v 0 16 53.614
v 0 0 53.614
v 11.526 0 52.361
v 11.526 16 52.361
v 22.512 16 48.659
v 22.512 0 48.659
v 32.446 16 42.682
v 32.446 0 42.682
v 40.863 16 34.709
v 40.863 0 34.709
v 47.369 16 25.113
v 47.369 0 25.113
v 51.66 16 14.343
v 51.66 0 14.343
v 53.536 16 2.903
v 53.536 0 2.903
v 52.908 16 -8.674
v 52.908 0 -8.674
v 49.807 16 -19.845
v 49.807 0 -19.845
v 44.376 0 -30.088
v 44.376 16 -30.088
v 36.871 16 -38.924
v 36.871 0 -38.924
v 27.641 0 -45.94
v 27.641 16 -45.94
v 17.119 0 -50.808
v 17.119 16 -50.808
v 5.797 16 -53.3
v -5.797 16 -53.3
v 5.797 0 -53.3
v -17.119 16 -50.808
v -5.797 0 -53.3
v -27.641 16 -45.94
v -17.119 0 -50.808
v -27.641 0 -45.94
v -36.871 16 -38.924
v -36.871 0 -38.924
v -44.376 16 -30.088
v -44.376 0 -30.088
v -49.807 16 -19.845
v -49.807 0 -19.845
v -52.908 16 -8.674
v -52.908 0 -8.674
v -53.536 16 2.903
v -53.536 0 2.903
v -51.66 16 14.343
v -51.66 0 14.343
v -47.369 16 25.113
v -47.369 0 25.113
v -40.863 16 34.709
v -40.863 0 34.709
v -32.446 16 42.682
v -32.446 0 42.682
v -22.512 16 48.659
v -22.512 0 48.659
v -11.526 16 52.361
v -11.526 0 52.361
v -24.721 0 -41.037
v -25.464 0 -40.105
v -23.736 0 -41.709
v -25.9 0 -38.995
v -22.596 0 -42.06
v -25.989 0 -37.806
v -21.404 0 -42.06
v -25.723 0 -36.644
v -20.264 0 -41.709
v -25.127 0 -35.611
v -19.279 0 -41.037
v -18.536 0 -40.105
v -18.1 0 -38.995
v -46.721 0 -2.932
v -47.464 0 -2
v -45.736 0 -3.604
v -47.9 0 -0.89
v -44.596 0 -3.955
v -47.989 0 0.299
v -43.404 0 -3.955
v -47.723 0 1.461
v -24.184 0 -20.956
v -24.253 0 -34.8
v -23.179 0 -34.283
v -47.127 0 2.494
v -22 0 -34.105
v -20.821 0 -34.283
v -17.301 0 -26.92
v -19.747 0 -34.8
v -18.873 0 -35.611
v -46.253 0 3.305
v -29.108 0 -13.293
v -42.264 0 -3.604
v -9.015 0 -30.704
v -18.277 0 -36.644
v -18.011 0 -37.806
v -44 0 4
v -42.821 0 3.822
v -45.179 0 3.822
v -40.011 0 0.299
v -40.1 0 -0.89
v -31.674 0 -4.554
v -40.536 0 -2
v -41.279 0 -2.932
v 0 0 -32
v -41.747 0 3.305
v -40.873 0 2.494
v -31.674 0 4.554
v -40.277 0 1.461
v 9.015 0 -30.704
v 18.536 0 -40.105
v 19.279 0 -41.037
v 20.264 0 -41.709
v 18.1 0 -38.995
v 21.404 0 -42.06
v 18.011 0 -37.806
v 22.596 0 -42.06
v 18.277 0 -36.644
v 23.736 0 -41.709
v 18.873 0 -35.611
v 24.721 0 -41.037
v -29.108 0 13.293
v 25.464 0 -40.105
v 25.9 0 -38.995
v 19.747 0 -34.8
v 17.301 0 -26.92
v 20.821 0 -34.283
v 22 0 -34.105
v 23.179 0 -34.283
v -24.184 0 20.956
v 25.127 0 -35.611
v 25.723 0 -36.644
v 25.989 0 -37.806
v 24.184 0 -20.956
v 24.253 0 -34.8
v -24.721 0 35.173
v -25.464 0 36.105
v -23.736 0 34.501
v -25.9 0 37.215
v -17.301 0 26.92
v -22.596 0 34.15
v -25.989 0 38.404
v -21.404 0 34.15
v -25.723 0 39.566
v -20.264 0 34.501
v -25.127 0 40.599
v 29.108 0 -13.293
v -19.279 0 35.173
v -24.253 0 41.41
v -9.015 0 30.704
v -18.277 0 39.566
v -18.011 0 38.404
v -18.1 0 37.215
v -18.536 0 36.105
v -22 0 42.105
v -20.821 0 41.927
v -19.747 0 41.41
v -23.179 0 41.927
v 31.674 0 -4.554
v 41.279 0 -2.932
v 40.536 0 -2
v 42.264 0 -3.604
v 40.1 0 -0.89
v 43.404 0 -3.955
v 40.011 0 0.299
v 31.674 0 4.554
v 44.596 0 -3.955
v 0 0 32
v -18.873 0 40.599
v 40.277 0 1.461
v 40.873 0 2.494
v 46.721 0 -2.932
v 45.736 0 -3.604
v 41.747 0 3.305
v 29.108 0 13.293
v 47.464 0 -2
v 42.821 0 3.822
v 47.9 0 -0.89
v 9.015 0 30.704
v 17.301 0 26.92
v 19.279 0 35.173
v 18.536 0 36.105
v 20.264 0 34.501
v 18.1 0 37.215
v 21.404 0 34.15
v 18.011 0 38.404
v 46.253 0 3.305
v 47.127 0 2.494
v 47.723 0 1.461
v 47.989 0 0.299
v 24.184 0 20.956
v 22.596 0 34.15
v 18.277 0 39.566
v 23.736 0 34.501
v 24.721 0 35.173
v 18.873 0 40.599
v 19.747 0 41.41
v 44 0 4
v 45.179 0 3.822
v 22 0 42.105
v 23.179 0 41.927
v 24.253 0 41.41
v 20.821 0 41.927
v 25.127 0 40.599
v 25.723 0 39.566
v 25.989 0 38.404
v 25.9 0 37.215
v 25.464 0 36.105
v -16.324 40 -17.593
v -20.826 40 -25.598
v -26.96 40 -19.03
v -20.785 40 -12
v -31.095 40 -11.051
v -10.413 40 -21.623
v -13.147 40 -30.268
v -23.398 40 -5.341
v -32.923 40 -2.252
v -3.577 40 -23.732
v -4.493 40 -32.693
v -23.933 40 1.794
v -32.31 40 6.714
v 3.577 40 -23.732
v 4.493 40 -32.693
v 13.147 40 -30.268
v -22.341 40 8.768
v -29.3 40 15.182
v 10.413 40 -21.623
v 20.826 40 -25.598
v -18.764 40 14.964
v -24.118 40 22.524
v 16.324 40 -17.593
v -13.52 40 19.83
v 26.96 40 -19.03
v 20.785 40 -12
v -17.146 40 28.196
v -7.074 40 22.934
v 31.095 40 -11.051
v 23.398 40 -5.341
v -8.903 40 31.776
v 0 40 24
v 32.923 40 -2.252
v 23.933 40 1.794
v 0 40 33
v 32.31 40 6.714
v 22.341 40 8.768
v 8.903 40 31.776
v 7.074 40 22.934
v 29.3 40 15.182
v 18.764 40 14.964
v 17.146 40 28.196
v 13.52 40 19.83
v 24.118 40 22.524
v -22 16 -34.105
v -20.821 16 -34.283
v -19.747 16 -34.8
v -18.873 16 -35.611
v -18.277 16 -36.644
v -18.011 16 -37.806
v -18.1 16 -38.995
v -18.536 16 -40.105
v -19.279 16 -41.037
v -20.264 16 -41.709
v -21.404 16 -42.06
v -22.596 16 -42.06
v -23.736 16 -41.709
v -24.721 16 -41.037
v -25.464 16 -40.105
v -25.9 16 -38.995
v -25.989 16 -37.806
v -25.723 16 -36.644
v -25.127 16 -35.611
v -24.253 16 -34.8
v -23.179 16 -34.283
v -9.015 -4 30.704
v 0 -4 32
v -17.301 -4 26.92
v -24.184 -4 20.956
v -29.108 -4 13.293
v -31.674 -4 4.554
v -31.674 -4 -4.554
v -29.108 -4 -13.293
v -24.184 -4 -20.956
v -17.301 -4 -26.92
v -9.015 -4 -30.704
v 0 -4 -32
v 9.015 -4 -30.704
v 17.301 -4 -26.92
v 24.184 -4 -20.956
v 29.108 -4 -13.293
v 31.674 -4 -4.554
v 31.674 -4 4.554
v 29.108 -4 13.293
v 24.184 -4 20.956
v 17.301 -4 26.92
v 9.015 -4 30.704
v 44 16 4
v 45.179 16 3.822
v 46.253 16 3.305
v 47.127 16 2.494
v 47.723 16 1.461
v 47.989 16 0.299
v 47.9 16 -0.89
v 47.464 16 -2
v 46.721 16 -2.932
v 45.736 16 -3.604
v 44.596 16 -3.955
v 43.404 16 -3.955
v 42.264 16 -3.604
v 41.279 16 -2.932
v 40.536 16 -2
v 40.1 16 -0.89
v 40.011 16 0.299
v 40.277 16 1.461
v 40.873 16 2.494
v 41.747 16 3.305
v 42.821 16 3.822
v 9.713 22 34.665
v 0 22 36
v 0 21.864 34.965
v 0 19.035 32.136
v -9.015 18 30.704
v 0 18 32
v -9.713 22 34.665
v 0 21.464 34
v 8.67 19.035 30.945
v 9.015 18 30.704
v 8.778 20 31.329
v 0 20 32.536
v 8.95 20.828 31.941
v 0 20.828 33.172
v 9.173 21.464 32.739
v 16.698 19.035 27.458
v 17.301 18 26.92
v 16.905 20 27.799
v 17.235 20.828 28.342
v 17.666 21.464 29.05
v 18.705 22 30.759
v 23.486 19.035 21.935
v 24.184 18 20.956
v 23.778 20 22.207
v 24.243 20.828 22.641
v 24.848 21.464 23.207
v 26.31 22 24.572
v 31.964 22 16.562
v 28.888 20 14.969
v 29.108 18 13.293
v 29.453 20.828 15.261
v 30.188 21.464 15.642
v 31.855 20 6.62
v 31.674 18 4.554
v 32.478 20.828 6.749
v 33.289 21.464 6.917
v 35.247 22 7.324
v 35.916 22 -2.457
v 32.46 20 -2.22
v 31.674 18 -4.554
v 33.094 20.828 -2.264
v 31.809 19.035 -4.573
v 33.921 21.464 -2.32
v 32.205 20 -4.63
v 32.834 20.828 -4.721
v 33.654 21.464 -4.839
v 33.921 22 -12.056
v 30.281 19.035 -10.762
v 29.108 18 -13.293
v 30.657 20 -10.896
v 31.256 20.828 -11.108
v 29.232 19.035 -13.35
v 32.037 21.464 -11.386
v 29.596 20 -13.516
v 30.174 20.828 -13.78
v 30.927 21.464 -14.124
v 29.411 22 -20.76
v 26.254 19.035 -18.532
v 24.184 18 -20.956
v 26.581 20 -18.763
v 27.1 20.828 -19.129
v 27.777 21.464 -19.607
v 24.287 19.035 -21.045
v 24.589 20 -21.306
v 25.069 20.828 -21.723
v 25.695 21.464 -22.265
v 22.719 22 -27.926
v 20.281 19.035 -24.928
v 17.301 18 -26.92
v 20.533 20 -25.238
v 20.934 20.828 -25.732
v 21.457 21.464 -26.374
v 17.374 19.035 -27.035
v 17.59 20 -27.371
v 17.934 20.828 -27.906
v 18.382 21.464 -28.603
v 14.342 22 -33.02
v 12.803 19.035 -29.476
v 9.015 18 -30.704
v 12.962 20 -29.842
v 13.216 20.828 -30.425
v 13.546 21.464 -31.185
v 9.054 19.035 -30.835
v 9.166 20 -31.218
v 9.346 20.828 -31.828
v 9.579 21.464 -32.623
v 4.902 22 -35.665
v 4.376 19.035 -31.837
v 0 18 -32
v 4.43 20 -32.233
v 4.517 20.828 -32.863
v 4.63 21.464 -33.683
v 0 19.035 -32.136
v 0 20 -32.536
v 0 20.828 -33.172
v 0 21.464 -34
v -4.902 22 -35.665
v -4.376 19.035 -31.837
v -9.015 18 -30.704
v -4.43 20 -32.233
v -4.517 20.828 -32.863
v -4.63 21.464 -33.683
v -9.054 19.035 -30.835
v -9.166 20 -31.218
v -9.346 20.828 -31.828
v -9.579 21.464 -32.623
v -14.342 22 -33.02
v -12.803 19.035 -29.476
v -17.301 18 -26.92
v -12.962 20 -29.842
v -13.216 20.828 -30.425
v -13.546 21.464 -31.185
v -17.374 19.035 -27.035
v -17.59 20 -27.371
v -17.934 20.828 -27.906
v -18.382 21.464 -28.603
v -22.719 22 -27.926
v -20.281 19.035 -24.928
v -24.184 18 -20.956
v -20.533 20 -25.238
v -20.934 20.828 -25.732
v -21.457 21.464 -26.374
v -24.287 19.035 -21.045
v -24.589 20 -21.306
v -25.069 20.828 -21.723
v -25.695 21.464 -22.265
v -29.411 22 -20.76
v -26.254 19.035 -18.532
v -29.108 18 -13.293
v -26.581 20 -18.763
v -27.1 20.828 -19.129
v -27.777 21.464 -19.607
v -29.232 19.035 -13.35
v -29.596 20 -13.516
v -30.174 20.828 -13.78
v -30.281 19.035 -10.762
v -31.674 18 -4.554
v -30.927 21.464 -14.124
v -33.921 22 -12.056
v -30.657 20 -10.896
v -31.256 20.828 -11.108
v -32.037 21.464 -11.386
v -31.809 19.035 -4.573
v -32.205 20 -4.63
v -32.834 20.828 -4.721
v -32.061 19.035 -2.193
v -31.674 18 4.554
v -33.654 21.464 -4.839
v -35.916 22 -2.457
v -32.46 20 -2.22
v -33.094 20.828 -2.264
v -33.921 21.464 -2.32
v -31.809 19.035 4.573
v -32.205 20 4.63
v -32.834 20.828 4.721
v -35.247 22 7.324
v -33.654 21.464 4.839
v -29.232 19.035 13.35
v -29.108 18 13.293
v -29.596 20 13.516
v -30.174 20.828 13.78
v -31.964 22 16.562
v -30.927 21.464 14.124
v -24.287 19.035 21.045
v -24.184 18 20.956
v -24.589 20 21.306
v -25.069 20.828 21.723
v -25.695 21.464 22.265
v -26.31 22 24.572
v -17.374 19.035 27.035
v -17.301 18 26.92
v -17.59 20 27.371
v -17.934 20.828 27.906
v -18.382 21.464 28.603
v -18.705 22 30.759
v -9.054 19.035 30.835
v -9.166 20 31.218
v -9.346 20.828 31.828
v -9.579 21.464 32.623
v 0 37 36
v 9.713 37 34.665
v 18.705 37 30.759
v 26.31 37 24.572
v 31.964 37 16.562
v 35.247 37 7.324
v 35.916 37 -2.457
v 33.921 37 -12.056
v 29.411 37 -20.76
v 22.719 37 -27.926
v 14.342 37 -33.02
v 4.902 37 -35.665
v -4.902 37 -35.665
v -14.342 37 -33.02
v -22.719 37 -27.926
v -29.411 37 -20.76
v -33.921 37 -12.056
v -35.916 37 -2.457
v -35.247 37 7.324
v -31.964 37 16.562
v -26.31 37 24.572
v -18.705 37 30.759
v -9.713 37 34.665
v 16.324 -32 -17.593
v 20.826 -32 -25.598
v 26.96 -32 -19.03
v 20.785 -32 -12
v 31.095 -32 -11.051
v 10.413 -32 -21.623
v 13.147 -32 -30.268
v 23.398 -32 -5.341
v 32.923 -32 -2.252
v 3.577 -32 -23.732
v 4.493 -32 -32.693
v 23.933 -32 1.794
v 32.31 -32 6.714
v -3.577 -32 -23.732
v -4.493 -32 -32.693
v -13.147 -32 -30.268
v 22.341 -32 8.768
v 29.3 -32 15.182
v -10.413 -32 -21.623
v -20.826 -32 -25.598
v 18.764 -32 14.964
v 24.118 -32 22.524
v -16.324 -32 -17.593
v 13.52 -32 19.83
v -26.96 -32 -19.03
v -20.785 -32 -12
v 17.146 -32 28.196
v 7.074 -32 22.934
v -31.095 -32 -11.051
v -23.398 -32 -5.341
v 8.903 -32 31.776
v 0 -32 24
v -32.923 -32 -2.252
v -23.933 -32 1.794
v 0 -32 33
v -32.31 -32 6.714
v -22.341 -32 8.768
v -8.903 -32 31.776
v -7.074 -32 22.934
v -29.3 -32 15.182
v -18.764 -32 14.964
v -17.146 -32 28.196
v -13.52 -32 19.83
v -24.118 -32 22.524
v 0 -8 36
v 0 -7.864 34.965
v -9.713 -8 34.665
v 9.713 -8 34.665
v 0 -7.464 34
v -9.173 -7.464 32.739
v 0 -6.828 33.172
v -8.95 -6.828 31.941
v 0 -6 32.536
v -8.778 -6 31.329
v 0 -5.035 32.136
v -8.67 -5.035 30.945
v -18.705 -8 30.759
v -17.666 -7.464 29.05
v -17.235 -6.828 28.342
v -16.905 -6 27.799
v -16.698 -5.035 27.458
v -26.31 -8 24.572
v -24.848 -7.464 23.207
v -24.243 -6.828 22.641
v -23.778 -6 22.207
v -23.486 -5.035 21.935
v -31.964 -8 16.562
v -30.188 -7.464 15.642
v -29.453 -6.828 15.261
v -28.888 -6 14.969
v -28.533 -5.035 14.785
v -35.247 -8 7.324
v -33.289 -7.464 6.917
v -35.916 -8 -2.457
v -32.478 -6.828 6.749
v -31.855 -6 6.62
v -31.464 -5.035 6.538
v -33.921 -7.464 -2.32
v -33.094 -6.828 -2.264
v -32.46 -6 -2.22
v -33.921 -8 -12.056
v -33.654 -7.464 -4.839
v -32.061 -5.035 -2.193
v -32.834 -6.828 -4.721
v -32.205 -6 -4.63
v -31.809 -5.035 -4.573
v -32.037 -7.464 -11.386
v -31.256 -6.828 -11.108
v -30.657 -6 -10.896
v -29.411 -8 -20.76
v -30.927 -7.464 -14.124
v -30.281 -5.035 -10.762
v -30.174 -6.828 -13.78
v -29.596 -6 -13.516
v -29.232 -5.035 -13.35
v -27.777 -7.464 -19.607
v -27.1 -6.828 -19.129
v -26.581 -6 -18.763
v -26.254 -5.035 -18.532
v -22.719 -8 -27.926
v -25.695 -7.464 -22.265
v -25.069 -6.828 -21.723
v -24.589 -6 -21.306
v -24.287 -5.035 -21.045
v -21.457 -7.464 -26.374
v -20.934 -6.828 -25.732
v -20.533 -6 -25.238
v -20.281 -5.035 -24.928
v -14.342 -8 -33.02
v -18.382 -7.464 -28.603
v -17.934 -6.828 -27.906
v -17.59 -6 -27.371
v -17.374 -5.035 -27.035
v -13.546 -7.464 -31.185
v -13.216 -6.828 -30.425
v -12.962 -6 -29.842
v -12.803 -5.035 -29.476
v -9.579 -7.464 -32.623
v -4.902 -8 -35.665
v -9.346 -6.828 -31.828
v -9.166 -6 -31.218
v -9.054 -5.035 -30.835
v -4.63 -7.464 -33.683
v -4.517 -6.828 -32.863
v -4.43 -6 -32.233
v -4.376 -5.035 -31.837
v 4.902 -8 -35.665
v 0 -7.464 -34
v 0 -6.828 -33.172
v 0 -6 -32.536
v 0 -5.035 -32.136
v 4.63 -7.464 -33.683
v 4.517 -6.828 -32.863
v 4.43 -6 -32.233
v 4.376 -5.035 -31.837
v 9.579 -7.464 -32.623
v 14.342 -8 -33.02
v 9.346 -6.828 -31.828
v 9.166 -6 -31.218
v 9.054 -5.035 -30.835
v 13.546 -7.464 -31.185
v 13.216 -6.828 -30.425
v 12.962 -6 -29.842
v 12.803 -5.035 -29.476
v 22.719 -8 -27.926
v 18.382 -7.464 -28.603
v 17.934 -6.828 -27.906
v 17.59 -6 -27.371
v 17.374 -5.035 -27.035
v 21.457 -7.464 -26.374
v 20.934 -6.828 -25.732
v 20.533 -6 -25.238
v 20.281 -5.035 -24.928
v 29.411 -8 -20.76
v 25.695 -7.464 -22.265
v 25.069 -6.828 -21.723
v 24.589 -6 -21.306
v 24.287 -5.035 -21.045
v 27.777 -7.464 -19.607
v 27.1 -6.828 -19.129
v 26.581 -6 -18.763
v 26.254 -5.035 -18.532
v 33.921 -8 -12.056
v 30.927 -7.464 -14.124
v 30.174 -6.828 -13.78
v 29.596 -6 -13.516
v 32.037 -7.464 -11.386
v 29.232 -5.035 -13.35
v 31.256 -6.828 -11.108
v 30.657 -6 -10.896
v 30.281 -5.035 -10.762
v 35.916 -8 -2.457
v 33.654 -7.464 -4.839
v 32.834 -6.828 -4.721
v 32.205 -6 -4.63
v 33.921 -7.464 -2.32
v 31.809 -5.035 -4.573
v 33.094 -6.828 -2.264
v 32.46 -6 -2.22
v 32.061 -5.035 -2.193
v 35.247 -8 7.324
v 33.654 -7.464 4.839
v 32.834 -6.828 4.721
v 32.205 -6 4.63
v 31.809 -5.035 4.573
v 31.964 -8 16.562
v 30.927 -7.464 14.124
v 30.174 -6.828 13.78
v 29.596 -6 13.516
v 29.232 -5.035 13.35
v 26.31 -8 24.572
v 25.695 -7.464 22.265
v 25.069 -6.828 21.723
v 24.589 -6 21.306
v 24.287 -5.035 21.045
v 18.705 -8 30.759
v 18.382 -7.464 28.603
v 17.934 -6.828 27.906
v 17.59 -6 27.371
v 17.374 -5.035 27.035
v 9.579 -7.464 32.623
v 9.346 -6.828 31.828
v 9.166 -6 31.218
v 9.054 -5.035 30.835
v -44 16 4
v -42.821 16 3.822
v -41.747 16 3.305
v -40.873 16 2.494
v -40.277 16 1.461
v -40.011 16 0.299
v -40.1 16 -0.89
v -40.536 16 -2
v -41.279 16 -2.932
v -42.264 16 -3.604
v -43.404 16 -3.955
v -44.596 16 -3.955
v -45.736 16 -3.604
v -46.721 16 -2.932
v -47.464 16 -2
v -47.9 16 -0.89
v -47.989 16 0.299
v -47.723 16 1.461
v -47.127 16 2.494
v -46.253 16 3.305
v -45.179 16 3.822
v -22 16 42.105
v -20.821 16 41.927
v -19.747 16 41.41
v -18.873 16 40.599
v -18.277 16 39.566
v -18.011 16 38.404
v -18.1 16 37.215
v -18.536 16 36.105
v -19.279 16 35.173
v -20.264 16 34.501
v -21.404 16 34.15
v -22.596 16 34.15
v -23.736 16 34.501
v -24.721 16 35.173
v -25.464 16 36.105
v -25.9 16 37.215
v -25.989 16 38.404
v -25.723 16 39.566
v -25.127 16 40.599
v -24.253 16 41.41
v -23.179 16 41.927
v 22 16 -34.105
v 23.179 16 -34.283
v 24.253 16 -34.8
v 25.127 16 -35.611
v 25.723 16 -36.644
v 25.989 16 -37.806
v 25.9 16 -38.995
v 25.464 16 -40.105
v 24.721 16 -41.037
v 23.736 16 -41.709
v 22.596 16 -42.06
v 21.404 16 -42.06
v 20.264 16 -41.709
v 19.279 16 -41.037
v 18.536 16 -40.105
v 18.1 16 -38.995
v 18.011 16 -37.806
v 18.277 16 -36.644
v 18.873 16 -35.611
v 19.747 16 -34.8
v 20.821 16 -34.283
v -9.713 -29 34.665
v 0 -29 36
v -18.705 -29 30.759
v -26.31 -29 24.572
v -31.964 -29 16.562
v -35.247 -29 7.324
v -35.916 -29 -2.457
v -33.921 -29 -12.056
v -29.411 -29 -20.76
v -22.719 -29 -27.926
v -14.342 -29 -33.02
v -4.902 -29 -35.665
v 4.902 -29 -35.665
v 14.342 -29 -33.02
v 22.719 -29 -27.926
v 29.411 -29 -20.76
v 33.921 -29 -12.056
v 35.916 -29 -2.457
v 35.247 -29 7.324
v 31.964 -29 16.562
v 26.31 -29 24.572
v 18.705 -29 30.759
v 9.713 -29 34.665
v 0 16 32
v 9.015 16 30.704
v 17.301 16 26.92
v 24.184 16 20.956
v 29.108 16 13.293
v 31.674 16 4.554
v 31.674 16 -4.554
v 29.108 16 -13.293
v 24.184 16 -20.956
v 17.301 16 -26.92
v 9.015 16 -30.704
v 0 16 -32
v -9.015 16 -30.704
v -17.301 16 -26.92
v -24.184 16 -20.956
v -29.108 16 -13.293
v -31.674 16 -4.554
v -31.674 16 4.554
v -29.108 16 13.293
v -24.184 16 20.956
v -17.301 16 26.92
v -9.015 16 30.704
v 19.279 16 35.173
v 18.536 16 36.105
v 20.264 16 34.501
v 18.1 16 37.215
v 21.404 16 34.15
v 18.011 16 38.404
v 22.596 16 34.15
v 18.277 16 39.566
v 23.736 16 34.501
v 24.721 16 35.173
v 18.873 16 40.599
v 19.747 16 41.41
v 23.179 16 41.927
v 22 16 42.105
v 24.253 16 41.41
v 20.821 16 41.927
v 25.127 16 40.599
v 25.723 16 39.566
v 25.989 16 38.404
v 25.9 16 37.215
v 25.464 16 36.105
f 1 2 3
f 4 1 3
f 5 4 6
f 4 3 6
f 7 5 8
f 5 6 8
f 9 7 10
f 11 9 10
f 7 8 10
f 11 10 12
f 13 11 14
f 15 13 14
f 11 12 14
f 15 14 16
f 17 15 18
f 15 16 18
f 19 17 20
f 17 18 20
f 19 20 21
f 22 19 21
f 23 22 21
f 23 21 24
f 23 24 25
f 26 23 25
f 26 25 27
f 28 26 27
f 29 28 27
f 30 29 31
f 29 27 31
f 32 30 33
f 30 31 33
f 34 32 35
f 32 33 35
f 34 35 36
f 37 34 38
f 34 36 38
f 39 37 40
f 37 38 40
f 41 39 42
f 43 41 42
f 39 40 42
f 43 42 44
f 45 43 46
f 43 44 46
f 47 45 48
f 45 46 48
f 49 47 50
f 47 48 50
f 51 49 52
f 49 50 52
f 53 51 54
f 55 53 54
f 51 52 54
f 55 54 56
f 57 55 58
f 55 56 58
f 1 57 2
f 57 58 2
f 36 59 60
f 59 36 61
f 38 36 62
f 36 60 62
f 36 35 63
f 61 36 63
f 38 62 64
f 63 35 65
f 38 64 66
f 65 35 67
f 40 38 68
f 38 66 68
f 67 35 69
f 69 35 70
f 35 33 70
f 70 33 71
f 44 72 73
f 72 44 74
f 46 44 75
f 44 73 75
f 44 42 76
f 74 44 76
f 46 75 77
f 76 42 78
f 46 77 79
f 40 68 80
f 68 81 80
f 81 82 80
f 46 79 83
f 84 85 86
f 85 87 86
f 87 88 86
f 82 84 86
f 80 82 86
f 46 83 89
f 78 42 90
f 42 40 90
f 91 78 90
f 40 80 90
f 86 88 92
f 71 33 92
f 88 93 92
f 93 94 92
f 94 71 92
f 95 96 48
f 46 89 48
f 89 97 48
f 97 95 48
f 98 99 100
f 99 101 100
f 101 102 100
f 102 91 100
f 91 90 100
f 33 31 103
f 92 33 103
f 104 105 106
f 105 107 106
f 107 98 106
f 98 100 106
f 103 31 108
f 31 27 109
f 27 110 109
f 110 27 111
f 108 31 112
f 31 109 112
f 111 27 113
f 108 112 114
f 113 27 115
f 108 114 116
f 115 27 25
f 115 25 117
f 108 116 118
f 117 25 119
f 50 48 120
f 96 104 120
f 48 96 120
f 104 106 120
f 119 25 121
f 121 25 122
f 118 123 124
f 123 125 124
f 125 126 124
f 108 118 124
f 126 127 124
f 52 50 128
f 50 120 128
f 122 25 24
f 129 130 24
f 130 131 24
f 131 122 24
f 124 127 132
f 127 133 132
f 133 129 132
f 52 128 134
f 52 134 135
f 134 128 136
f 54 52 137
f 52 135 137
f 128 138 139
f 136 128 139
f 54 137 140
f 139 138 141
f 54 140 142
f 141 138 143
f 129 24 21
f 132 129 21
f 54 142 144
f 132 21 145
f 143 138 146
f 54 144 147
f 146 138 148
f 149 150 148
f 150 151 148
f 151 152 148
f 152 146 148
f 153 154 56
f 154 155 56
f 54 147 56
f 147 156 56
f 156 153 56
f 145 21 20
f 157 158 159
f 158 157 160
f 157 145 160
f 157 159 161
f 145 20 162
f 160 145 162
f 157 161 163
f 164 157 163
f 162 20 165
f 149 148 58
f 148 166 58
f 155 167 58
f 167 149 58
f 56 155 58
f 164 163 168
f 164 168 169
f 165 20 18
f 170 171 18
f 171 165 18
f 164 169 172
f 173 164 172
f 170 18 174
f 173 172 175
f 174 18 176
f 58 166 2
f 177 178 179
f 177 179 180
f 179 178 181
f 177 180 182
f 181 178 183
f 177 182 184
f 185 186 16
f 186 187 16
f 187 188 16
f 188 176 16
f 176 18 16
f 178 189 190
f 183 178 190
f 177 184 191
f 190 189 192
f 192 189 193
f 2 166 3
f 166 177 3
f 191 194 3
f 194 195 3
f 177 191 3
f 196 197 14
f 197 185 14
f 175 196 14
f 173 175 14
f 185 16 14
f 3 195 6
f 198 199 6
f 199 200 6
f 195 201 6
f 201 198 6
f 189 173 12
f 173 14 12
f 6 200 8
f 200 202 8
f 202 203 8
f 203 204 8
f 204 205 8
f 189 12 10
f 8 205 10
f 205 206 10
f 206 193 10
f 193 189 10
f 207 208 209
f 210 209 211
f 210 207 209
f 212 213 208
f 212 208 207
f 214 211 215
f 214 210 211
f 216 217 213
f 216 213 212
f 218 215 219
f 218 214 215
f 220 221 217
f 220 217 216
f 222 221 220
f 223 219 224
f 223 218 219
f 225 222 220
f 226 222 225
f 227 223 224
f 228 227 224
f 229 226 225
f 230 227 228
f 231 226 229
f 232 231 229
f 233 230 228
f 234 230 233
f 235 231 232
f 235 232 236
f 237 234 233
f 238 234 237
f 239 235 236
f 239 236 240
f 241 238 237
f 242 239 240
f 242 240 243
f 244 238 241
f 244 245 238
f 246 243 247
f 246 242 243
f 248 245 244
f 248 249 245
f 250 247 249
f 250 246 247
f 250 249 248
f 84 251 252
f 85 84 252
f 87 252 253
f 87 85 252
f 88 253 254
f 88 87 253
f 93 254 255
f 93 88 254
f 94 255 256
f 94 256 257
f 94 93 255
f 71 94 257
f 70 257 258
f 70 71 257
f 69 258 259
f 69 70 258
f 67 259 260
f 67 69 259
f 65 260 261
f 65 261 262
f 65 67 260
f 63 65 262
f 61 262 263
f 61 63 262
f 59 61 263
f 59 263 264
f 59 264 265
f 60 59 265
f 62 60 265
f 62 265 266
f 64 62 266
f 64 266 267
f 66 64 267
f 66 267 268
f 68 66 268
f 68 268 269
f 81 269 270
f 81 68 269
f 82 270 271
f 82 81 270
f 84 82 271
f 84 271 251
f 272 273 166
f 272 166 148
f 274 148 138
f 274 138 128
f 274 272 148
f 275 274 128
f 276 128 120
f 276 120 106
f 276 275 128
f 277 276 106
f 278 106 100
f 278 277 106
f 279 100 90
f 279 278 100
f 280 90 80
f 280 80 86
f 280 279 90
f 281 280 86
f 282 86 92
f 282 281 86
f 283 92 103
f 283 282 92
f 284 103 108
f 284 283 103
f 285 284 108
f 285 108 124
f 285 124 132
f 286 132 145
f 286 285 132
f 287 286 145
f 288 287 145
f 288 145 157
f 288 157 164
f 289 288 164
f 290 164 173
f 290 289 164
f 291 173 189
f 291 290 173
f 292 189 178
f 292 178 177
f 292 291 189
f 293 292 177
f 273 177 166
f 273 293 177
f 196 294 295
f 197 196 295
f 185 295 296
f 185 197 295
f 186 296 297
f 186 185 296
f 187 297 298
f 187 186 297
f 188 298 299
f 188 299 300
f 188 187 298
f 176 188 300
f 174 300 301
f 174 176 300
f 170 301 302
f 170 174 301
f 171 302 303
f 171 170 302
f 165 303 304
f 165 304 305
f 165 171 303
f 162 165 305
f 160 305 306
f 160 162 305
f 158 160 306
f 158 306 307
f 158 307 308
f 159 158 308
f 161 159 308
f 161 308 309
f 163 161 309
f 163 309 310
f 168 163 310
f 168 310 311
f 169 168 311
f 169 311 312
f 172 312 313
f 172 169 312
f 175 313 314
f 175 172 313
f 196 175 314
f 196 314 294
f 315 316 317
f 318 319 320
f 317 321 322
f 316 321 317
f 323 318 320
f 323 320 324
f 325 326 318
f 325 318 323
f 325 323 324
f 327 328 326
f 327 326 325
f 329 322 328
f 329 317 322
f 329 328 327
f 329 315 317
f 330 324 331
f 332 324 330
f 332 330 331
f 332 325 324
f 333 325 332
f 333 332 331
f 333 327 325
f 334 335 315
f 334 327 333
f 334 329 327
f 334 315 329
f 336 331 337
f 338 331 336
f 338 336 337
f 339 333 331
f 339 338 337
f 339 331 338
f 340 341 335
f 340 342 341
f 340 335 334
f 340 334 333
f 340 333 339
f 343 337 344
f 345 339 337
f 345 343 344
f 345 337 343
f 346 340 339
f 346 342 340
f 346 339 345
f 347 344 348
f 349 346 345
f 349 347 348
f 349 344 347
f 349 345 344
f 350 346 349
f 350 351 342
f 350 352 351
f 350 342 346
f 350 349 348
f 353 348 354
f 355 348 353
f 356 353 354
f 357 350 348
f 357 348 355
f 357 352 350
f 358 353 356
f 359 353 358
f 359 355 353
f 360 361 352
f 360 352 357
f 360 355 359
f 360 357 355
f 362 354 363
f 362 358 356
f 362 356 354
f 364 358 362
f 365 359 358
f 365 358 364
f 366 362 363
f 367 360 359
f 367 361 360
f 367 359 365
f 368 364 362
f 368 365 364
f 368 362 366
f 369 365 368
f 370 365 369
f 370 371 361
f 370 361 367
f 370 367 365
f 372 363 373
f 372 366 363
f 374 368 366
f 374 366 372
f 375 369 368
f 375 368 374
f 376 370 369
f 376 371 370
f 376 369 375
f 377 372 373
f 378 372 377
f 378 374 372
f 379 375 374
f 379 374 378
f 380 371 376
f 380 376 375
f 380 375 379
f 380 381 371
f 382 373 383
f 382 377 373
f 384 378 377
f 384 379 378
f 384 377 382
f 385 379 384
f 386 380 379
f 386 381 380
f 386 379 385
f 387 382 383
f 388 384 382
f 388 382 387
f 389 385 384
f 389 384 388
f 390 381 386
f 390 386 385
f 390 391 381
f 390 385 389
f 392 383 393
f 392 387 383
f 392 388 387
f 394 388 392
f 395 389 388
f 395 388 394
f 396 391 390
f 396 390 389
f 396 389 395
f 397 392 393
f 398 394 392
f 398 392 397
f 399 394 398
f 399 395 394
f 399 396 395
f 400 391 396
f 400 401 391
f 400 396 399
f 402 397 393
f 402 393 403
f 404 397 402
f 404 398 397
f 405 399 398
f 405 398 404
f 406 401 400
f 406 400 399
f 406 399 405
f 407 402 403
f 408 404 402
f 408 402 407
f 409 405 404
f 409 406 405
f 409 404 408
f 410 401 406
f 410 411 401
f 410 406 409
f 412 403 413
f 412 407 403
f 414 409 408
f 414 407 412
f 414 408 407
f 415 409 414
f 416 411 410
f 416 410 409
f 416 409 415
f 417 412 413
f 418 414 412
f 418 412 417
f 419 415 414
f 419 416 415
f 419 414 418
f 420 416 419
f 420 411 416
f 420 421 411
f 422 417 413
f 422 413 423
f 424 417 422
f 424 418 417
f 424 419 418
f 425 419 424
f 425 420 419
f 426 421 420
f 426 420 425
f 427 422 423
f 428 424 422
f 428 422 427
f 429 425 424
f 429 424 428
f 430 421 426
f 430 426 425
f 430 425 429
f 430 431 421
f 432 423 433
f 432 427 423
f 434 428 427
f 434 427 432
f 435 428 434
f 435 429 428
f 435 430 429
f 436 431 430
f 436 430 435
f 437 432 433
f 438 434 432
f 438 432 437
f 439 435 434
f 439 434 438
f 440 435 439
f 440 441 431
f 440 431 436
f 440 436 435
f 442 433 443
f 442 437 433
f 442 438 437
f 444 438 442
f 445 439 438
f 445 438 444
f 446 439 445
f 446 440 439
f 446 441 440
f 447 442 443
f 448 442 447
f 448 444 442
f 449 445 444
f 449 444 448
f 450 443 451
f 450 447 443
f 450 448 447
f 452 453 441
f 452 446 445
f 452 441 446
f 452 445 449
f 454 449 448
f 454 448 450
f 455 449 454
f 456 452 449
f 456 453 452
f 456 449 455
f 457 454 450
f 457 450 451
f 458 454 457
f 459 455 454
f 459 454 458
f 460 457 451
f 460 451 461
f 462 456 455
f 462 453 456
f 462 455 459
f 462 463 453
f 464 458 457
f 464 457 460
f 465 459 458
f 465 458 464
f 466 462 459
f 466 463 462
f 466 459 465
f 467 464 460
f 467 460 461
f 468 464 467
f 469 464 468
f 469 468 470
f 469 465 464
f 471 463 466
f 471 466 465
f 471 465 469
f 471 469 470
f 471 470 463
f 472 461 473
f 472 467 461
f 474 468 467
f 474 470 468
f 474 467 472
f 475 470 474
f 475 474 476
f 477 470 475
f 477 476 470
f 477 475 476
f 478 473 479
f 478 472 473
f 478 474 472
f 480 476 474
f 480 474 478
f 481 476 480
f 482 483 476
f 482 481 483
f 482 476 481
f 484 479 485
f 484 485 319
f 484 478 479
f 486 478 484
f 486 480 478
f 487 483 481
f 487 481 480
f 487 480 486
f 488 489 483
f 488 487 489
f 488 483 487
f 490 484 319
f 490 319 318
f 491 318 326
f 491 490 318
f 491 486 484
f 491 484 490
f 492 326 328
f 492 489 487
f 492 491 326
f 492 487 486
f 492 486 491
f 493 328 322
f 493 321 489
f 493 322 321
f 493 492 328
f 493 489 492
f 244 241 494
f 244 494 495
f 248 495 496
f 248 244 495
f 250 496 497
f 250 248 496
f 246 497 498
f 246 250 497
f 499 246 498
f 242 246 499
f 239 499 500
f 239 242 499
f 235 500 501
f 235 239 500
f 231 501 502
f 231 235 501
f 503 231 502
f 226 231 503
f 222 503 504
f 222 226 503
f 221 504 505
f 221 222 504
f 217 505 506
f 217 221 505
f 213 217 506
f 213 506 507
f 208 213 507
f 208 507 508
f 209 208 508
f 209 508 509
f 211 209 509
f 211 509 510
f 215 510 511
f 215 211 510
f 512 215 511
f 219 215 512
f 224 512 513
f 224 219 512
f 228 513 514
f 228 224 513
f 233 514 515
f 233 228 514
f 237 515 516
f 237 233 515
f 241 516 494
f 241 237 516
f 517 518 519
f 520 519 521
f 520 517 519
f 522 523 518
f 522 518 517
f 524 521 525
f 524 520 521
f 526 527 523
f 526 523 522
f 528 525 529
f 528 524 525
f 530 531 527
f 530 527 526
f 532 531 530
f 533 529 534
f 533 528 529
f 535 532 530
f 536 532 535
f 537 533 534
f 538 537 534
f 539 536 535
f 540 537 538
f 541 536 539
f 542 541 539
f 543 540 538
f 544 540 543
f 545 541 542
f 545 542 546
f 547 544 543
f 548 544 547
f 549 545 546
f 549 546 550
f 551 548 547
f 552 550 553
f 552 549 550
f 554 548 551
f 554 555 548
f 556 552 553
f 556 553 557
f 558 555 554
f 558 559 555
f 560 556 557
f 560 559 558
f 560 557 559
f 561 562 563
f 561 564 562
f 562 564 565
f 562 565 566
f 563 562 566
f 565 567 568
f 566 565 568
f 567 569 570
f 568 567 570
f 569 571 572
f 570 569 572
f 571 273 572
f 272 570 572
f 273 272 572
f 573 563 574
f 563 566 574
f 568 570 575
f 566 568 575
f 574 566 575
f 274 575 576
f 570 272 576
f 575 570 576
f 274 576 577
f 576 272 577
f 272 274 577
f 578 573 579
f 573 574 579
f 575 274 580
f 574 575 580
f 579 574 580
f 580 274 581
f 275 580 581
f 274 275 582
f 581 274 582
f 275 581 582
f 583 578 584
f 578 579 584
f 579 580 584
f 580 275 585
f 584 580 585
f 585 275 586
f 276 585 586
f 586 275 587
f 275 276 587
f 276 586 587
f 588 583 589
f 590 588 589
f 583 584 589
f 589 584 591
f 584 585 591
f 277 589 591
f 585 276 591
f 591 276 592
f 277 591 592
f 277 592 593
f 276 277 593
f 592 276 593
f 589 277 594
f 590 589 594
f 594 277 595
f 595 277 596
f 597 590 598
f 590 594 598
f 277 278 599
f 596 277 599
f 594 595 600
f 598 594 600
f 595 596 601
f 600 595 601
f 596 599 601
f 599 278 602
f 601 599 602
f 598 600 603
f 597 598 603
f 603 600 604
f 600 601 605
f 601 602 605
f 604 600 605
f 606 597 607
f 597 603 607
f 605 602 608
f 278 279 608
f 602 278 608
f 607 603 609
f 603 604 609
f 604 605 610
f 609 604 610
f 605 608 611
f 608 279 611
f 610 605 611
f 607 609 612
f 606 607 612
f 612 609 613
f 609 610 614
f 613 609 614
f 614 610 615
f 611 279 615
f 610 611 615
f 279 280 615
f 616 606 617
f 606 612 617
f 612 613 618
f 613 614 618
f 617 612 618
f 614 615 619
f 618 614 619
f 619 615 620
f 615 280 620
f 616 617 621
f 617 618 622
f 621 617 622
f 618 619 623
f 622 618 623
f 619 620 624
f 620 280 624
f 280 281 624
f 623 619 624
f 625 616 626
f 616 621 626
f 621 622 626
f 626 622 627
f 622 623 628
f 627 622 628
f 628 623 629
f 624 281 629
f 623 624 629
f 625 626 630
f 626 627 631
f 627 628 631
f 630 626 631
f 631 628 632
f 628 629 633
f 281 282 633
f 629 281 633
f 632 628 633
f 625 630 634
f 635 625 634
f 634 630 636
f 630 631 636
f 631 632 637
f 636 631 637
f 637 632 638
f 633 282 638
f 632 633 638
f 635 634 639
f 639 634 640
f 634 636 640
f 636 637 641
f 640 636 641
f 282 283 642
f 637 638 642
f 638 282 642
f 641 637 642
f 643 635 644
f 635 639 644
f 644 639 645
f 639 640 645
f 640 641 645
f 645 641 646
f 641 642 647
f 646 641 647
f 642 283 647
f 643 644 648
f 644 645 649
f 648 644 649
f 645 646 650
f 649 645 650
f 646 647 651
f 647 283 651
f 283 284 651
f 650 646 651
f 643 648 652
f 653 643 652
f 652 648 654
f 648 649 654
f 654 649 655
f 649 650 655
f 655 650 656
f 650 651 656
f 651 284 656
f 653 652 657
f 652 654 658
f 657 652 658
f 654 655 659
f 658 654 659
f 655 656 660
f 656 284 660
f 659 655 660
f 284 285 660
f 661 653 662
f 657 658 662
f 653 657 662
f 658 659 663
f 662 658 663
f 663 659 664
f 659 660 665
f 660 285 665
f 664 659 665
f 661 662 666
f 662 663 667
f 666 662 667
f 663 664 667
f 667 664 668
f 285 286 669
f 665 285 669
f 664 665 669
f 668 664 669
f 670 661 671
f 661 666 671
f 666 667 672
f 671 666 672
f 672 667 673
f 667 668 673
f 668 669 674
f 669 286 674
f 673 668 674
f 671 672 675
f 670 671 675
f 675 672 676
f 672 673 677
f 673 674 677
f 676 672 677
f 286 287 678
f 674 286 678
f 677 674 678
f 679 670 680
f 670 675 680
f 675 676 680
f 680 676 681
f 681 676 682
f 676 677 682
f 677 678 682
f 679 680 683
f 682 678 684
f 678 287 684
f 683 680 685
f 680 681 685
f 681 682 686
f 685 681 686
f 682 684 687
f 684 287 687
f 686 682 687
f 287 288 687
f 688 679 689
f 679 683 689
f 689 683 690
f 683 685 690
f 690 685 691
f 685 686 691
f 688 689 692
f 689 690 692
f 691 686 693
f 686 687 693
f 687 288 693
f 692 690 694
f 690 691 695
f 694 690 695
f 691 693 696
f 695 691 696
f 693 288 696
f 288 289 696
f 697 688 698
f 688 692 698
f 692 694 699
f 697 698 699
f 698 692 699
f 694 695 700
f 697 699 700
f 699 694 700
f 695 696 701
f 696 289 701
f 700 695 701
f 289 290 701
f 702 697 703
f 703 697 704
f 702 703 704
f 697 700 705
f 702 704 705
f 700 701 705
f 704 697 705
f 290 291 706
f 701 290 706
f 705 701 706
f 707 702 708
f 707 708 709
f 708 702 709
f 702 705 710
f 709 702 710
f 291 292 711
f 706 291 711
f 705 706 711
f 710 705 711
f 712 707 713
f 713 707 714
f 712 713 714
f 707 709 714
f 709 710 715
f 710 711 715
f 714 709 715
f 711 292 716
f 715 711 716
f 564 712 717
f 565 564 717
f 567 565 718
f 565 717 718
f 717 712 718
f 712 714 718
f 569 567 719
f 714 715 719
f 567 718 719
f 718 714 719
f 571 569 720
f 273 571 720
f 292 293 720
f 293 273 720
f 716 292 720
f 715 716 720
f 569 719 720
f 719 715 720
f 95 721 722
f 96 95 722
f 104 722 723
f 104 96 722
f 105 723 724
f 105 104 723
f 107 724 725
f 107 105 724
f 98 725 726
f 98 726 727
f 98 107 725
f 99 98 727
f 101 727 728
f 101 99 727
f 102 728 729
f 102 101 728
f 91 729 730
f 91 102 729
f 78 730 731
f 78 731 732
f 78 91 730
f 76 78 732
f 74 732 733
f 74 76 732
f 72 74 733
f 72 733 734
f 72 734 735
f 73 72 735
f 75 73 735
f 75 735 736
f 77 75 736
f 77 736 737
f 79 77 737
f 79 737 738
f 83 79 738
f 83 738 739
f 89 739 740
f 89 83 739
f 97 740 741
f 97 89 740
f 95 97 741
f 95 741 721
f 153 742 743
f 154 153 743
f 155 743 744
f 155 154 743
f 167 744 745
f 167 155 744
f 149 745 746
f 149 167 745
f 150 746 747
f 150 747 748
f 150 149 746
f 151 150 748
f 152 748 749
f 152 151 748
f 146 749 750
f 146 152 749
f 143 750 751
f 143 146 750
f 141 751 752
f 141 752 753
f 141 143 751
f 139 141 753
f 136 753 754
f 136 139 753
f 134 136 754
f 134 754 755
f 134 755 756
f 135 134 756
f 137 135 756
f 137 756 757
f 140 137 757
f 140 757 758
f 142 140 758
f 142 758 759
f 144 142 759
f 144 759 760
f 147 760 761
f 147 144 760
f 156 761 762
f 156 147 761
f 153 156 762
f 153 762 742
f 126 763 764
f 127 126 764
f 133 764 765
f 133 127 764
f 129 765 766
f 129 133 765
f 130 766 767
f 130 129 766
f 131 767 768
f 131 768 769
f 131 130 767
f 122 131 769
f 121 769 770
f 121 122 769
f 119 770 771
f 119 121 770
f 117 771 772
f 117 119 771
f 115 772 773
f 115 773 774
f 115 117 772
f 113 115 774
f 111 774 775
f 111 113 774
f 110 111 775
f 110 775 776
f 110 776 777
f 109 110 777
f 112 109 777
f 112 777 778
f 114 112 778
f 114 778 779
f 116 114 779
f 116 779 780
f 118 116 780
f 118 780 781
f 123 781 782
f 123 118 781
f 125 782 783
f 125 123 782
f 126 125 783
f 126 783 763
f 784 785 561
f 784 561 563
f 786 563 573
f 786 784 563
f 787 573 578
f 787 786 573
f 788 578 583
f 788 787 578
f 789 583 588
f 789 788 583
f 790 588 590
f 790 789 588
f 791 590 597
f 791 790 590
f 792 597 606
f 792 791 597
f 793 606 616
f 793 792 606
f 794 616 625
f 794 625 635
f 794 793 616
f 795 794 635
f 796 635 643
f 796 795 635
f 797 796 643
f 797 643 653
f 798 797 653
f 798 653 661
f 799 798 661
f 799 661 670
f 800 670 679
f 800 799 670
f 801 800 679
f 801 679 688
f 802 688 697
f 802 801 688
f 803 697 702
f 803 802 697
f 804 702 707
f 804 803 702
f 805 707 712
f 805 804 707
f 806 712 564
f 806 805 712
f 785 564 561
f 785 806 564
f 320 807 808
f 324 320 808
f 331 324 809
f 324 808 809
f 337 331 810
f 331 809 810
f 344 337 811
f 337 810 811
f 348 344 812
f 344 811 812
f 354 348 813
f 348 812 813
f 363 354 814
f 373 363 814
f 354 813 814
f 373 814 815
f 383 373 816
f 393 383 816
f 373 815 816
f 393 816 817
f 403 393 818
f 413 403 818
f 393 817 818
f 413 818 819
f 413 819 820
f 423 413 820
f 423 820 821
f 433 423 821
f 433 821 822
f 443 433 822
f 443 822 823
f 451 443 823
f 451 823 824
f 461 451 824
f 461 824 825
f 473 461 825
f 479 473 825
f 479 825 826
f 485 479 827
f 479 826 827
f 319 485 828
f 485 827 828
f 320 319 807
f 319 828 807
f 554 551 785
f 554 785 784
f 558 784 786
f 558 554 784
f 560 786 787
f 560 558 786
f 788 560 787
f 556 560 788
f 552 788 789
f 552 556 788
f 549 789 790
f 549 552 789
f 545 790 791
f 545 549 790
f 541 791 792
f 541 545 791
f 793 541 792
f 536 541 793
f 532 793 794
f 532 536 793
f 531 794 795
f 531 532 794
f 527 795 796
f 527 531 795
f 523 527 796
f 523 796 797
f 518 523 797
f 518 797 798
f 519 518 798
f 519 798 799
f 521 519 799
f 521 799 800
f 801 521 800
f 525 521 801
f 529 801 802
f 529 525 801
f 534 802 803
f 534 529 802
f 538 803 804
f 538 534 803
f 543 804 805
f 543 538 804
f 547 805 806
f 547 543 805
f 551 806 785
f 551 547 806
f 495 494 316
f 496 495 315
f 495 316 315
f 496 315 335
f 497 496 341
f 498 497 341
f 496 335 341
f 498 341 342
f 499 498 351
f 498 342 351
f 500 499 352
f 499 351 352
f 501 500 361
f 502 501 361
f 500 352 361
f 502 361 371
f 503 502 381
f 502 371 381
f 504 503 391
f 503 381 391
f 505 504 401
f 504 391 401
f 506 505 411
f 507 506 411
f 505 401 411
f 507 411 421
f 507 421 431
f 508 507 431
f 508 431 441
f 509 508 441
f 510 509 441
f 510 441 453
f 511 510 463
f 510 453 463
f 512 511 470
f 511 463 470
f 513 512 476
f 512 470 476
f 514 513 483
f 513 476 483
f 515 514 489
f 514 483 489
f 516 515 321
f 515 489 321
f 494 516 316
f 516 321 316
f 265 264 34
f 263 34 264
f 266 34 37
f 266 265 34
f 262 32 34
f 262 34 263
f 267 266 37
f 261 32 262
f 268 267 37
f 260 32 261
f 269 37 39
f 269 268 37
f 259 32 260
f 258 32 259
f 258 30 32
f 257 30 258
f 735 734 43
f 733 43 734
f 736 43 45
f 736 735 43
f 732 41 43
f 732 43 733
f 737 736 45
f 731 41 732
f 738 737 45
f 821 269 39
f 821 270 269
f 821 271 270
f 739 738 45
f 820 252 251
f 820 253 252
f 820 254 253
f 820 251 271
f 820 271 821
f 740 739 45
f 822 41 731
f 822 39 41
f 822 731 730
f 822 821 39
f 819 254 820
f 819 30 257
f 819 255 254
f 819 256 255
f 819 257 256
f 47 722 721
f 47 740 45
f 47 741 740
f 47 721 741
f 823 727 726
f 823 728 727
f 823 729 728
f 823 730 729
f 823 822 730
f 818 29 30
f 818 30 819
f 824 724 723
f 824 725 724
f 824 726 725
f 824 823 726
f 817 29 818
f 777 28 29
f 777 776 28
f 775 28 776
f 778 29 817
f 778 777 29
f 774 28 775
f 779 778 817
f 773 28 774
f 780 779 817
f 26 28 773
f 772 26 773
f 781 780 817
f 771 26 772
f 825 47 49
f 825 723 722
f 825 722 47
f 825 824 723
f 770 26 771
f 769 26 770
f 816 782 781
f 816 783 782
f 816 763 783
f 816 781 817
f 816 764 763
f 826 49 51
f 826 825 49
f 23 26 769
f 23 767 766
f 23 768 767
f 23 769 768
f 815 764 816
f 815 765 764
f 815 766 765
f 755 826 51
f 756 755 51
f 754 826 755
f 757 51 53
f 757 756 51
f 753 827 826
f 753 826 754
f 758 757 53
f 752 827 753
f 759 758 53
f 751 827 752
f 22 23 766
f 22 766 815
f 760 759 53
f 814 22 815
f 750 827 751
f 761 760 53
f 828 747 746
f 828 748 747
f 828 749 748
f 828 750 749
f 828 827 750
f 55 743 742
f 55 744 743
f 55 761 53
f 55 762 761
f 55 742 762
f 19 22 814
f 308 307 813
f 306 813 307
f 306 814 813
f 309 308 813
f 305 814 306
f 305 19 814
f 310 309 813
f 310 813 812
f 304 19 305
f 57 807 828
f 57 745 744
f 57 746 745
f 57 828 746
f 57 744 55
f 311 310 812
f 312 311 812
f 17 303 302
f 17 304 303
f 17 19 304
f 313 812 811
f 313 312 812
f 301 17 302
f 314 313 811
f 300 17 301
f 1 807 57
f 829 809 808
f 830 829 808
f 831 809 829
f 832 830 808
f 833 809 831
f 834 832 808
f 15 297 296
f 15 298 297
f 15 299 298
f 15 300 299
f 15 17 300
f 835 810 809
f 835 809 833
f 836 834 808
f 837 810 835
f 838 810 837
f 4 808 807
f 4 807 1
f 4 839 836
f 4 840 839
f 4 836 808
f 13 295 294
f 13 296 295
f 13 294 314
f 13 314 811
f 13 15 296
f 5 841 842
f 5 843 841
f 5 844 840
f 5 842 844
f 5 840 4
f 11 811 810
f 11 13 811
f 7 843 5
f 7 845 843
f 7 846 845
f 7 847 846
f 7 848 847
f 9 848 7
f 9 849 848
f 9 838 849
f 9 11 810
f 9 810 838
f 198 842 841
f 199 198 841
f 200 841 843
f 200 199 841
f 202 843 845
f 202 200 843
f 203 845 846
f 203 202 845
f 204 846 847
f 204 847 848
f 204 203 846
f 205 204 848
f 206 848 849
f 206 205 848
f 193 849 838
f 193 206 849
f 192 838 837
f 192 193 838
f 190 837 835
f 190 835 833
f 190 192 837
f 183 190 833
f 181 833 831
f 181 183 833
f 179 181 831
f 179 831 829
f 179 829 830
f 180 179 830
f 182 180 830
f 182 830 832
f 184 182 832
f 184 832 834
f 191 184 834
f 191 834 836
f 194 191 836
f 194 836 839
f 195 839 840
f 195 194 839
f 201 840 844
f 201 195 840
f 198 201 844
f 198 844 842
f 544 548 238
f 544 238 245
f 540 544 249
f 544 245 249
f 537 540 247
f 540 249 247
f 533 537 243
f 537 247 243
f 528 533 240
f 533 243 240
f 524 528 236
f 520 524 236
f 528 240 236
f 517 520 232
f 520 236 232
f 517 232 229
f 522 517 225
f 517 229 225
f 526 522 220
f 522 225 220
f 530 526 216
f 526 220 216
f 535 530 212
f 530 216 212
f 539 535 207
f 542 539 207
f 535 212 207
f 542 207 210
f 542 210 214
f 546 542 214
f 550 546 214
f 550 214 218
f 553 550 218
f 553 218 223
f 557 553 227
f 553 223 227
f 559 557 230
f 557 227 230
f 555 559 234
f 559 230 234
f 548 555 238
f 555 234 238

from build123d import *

# Parameters (mm, degrees)
SKETCH1_R           = 53.614398493
SKETCH1_R_2         = 4
BOSS_EXTRUDE1_DEPTH = 16
SKETCH3_R           = 32
BOSS_EXTRUDE2_DEPTH = 6
SKETCH4_R           = 36
BOSS_EXTRUDE3_DEPTH = 18
BOSS_EXTRUDE4_START = 8
SKETCH5_R           = 32
BOSS_EXTRUDE4_DEPTH = 8
BOSS_EXTRUDE5_START = 24
SKETCH6_R           = 36
BOSS_EXTRUDE5_DEPTH = 24
FILLET2_R           = 4
CHAMFER2_SIZE       = 3
SKETCH7_R           = 24
CUT_EXTRUDE1_DEPTH  = 72


with BuildPart() as part:
    # Sketch1 → Boss-Extrude1 (new body)
    with BuildSketch(Plane(origin=(0, 0, 0), x_dir=(1, 0, 0), z_dir=(0, 1, 0))):
        with Locations(Location((0, 0, 0), (0, 0, 270))):
            Circle(SKETCH1_R)
        with Locations(Location((-44, 0, 0), (0, 0, 270))):
            Circle(SKETCH1_R_2, mode=Mode.SUBTRACT)
        with Locations(Location((-22, 38.105117767, 0), (0, 0, 270))):
            Circle(SKETCH1_R_2, mode=Mode.SUBTRACT)
        with Locations(Location((22, 38.105117767, 0), (0, 0, 270))):
            Circle(SKETCH1_R_2, mode=Mode.SUBTRACT)
        with Locations(Location((44, 0, 0), (0, 0, 270))):
            Circle(SKETCH1_R_2, mode=Mode.SUBTRACT)
        with Locations(Location((22, -38.105117767, 0), (0, 0, 270))):
            Circle(SKETCH1_R_2, mode=Mode.SUBTRACT)
        with Locations(Location((-22, -38.105117767, 0), (0, 0, 270))):
            Circle(SKETCH1_R_2, mode=Mode.SUBTRACT)
    extrude(amount=BOSS_EXTRUDE1_DEPTH)

    # Sketch3 → Boss-Extrude2 (add)
    with BuildSketch(Plane(origin=(0, 16, 0), x_dir=(1, 0, 0), z_dir=(0, 1, 0))):
        with Locations(Location((0, 0, 0), (0, 0, 270))):
            Circle(SKETCH3_R)
    extrude(amount=BOSS_EXTRUDE2_DEPTH)

    # Sketch4 → Boss-Extrude3 (add)
    with BuildSketch(Plane(origin=(0, 22, 0), x_dir=(1, 0, 0), z_dir=(0, 1, 0))):
        with Locations(Location((0, 0, 0), (0, 0, 270))):
            Circle(SKETCH4_R)
    extrude(amount=BOSS_EXTRUDE3_DEPTH)

    # Sketch5 → Boss-Extrude4 (add)
    with BuildSketch(Plane.XZ.offset(BOSS_EXTRUDE4_START)):
        with Locations(Location((0, 0, 0), (0, 0, 90))):
            Circle(SKETCH5_R)
    extrude(amount=-BOSS_EXTRUDE4_DEPTH)

    # Sketch6 → Boss-Extrude5 (add)
    with BuildSketch(Plane.XZ.offset(8).offset(BOSS_EXTRUDE5_START)):
        with Locations(Location((0, 0, 0), (0, 0, 90))):
            Circle(SKETCH6_R)
    extrude(amount=-BOSS_EXTRUDE5_DEPTH)

    # Fillet2
    fillet2_edges = [part.edges().sort_by_distance(p)[0] for p in [
        (0, 22, -32),
        (0, -8, -32),
    ]]
    fillet(fillet2_edges, radius=FILLET2_R - 0.0001)  # a hair under: the kernel refuses the full size

    # Chamfer2
    chamfer2_edges = [part.edges().sort_by_distance(p)[0] for p in [
        (0, 40, -36),
        (0, -32, -36),
    ]]
    chamfer(chamfer2_edges, length=CHAMFER2_SIZE)

    # Sketch7 → Cut-Extrude1 (cut)
    with BuildSketch(Plane(origin=(0, 40, 0), x_dir=(1, 0, 0), z_dir=(0, 1, 0))):
        with Locations(Location((0, 0, 0), (0, 0, 270))):
            Circle(SKETCH7_R)
    extrude(amount=-CUT_EXTRUDE1_DEPTH, mode=Mode.SUBTRACT)


solid = part.part
